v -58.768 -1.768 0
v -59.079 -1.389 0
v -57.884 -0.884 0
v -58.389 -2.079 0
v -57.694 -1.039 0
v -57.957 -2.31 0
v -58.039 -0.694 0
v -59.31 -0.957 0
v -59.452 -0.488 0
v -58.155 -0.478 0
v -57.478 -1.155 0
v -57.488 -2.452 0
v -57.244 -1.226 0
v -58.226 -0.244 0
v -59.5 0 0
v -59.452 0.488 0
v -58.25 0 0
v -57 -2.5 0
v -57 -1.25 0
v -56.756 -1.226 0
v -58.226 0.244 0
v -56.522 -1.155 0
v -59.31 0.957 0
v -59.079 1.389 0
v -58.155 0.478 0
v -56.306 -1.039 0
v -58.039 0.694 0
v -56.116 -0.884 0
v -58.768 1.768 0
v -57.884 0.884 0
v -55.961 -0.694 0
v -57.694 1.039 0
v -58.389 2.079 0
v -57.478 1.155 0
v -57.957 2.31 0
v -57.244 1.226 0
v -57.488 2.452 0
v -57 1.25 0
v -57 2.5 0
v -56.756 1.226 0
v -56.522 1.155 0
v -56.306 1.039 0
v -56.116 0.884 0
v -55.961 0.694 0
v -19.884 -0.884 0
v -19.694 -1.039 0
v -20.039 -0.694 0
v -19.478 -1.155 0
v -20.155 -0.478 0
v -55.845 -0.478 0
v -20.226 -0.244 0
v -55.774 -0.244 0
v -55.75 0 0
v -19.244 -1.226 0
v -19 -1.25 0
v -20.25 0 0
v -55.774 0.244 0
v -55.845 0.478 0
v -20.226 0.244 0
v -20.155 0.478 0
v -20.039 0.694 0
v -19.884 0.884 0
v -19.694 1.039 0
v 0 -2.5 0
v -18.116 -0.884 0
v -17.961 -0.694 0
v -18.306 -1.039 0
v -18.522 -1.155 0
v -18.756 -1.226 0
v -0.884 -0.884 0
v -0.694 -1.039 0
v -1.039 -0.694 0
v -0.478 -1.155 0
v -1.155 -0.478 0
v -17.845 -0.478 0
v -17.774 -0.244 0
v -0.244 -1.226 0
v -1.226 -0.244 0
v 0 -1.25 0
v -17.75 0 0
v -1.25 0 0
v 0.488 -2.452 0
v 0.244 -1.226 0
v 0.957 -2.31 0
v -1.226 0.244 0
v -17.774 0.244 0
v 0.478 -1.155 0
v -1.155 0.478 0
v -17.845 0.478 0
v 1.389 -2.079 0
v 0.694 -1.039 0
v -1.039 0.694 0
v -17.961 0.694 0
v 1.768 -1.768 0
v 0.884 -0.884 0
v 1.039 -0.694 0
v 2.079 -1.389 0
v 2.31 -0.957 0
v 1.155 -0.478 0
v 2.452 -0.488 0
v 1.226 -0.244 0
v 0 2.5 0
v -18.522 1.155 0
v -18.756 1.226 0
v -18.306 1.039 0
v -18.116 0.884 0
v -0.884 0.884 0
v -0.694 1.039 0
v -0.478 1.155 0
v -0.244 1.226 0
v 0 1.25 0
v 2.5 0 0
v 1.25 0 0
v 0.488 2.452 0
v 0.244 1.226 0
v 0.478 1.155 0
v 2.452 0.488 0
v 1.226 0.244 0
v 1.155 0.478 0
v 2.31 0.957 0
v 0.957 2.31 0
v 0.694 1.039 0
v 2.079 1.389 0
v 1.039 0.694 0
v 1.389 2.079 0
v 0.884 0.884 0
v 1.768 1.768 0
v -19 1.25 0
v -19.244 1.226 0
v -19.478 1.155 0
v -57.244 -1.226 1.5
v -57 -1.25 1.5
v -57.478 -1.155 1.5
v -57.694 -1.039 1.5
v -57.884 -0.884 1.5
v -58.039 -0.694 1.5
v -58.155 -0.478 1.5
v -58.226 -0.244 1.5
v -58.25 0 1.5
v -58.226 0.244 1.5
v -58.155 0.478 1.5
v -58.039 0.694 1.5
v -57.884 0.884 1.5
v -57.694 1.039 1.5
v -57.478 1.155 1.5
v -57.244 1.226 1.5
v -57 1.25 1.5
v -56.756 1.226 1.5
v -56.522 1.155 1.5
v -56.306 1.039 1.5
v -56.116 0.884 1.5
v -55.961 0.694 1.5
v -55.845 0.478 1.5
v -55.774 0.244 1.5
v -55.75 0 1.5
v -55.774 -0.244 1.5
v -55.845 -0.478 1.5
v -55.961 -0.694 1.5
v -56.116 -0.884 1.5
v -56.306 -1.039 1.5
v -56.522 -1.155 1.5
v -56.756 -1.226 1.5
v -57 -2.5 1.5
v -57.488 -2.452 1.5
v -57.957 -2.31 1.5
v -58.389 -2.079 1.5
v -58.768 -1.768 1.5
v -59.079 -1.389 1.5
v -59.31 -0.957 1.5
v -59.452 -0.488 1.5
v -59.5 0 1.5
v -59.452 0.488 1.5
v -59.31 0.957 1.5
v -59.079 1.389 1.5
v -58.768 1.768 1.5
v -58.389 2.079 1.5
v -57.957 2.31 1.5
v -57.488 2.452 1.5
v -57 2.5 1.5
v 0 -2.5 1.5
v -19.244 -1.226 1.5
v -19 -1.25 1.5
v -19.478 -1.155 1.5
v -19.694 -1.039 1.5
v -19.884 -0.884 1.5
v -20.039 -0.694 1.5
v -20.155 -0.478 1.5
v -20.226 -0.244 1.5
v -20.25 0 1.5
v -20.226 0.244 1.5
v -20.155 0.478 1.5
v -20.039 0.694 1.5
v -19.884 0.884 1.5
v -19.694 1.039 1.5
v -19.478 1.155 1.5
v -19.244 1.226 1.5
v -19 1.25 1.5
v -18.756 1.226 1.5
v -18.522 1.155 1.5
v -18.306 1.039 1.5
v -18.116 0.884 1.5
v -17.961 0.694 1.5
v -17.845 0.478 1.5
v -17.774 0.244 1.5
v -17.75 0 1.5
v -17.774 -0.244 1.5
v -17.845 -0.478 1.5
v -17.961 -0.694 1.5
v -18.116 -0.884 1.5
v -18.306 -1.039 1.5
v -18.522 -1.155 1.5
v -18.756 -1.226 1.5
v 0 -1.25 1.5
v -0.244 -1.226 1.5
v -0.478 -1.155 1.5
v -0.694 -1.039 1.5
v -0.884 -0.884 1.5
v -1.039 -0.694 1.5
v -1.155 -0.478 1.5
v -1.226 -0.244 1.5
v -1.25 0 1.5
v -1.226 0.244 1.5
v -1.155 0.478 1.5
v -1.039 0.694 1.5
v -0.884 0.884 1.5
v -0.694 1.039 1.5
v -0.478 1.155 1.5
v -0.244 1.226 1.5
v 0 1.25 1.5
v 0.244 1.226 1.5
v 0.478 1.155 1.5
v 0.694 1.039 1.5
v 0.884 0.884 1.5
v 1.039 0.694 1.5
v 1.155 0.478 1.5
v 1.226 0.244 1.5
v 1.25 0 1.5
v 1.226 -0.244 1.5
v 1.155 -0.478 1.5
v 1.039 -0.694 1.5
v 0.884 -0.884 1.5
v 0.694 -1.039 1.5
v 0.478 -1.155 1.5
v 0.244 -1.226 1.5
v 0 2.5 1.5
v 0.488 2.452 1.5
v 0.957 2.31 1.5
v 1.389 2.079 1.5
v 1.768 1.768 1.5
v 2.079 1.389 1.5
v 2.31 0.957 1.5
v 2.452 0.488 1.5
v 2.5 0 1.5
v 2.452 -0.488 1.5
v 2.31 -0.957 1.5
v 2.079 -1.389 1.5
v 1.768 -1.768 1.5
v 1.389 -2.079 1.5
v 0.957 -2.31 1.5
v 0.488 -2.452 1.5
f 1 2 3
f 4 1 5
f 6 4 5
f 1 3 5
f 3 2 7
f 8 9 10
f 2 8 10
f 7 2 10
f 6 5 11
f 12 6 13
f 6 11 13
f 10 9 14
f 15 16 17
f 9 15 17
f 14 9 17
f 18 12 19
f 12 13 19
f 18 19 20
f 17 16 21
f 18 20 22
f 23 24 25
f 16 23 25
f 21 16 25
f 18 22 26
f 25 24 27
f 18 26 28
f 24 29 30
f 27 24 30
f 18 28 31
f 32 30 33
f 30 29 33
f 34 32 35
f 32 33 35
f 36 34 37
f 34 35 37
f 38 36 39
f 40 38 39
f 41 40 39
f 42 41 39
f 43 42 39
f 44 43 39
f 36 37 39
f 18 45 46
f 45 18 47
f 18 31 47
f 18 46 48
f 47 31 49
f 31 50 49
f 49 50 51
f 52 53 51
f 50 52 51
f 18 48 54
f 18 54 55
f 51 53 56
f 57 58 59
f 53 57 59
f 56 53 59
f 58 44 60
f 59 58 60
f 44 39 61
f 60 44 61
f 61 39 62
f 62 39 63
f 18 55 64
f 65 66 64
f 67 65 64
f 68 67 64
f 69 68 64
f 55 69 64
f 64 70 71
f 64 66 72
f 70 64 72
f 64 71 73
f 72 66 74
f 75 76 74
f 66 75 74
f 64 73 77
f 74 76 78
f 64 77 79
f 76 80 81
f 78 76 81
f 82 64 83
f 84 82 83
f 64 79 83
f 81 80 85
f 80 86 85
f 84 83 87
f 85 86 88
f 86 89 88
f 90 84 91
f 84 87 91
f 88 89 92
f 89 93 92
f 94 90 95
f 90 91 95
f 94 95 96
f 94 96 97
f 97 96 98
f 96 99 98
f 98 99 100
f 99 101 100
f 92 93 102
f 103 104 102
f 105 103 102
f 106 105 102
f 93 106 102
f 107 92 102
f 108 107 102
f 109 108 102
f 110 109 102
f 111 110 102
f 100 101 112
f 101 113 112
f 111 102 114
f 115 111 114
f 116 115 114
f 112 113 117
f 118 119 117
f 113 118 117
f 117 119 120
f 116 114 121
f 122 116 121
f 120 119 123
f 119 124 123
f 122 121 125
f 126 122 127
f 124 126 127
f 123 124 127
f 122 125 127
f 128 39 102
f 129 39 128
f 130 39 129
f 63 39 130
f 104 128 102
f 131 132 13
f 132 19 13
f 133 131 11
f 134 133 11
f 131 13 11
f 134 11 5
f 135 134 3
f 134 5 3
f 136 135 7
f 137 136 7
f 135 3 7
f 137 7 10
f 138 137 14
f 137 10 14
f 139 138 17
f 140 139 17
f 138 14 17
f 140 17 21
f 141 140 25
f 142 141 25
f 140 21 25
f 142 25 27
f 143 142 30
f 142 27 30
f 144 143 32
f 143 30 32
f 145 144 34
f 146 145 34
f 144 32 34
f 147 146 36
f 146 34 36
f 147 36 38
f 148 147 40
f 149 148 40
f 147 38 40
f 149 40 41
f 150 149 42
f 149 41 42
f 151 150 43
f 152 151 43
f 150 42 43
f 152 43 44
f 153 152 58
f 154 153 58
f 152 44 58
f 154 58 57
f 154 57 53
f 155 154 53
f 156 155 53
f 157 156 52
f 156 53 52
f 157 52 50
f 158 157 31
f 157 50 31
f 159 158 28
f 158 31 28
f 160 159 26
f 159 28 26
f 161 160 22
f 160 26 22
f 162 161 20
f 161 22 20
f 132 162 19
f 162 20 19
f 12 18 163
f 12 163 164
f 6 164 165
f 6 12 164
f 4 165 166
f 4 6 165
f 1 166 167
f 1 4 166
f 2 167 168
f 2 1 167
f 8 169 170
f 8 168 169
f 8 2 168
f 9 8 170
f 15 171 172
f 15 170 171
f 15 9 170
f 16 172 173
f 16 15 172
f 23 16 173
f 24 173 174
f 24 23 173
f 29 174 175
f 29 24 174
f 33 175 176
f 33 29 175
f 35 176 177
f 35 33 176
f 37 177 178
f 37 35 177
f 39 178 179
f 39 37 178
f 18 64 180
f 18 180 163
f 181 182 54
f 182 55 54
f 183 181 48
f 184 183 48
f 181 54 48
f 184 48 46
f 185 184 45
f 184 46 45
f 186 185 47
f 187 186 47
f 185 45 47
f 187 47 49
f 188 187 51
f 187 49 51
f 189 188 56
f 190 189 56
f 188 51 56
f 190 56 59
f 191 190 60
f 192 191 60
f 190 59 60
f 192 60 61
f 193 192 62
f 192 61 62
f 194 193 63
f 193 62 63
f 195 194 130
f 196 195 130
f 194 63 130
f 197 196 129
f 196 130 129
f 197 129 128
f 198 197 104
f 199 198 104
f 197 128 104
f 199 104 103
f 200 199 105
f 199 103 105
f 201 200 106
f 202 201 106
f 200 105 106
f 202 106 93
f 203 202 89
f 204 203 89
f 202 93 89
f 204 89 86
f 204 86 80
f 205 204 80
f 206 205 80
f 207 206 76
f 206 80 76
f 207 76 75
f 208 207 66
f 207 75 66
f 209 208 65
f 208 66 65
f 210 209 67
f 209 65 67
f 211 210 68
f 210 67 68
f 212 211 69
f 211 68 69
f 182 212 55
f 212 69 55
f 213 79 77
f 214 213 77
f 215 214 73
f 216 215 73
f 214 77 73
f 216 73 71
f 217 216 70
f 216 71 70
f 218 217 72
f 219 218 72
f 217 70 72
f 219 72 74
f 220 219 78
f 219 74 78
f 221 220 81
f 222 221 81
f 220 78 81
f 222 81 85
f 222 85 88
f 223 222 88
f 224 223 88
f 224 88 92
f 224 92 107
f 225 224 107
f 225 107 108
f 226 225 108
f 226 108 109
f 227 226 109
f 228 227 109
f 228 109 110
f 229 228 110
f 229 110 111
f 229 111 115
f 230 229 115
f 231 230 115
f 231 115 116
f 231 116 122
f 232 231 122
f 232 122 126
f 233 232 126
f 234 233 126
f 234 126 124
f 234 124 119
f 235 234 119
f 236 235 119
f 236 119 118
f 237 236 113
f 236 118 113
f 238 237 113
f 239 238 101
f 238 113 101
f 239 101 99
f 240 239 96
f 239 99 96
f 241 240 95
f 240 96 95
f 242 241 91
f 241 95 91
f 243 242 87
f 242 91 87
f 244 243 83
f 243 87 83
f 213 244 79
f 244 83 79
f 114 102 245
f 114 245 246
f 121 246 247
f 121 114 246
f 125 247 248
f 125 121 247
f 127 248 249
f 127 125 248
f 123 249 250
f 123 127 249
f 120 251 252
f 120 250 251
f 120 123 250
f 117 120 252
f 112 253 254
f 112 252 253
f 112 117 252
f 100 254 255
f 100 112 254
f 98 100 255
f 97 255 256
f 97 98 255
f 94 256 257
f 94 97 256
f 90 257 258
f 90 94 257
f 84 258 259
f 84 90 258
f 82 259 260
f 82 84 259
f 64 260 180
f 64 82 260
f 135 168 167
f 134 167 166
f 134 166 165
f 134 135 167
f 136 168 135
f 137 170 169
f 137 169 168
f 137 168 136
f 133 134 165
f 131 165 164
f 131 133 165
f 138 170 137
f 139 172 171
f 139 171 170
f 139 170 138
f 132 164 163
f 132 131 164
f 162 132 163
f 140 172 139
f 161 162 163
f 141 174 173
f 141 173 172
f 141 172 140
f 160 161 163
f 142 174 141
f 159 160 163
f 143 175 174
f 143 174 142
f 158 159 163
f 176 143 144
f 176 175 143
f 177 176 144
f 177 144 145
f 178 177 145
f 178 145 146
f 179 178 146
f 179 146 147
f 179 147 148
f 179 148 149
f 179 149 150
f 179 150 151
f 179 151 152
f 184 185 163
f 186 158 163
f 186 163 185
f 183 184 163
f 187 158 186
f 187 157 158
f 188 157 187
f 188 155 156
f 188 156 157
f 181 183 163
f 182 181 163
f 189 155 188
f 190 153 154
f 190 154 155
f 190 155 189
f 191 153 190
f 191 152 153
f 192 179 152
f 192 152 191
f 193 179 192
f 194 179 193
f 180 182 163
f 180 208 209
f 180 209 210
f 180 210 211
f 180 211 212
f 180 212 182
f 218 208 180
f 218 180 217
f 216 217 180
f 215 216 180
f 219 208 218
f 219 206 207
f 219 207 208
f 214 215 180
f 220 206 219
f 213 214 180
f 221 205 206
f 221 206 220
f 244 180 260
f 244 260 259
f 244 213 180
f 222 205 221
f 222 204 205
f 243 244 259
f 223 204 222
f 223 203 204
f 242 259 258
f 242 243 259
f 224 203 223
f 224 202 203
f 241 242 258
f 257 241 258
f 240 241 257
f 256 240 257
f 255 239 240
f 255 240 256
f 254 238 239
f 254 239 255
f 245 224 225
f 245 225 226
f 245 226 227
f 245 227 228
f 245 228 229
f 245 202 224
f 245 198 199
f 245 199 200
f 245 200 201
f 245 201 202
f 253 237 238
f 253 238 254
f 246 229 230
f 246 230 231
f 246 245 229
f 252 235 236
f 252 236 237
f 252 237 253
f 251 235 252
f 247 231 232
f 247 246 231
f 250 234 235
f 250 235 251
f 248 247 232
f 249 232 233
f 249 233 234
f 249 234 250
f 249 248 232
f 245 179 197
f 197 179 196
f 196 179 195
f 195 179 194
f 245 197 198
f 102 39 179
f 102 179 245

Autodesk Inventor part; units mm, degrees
ref_plane "YZ Plane" through (0, 0, 0) normal (1, 0, 0) x (0, 1, 0)
ref_plane "XZ Plane" through (0, 0, 0) normal (0, 1, 0) x (-1, 0, 0)
ref_plane "XY Plane" through (0, 0, 0) normal (0, 0, 1) x (1, 0, 0)
sketch "Sketch1" plane through (0, 0, 0) normal (0, 0, 1) x (1, 0, 0)
  arc A0 (0, -2.5) -> (0, 2.5) centre (0, 0) ccw
  arc A1 (-57, 2.5) -> (-57, -2.5) centre (-57, 0) ccw
  line L0 (-57, 2.5) -> (0, 2.5)
  line L1 (0, -2.5) -> (-57, -2.5)
  dimension "d0" = 2.5
  dimension "d1" = 2.5
  dimension "d2" = 57
extrude "Extrusion1" add sketch "Sketch1" along normal blind 1.5
sketch "Sketch2" plane through (0, 0, 1.5) normal (0, 0, 1) x (1, 0, 0)
  arc A0 (0, -2.5) -> (0, 2.5) centre (0, 0) ccw projected
  arc A1 (-57, 2.5) -> (-57, -2.5) centre (-57, 0) ccw projected
  point P0 (-19, 0)
  dimension "d5" = 38
  dimension "d6" = 19
hole "Hole1" at (-57, 0, 1.5) at (-19, 0, 1.5) at (0, 0, 1.5) direction (0, 0, -1) diameter 2.5 end through all
properties part number "31 - Lever" material "Steel AISI 1020 108 ANLD"
